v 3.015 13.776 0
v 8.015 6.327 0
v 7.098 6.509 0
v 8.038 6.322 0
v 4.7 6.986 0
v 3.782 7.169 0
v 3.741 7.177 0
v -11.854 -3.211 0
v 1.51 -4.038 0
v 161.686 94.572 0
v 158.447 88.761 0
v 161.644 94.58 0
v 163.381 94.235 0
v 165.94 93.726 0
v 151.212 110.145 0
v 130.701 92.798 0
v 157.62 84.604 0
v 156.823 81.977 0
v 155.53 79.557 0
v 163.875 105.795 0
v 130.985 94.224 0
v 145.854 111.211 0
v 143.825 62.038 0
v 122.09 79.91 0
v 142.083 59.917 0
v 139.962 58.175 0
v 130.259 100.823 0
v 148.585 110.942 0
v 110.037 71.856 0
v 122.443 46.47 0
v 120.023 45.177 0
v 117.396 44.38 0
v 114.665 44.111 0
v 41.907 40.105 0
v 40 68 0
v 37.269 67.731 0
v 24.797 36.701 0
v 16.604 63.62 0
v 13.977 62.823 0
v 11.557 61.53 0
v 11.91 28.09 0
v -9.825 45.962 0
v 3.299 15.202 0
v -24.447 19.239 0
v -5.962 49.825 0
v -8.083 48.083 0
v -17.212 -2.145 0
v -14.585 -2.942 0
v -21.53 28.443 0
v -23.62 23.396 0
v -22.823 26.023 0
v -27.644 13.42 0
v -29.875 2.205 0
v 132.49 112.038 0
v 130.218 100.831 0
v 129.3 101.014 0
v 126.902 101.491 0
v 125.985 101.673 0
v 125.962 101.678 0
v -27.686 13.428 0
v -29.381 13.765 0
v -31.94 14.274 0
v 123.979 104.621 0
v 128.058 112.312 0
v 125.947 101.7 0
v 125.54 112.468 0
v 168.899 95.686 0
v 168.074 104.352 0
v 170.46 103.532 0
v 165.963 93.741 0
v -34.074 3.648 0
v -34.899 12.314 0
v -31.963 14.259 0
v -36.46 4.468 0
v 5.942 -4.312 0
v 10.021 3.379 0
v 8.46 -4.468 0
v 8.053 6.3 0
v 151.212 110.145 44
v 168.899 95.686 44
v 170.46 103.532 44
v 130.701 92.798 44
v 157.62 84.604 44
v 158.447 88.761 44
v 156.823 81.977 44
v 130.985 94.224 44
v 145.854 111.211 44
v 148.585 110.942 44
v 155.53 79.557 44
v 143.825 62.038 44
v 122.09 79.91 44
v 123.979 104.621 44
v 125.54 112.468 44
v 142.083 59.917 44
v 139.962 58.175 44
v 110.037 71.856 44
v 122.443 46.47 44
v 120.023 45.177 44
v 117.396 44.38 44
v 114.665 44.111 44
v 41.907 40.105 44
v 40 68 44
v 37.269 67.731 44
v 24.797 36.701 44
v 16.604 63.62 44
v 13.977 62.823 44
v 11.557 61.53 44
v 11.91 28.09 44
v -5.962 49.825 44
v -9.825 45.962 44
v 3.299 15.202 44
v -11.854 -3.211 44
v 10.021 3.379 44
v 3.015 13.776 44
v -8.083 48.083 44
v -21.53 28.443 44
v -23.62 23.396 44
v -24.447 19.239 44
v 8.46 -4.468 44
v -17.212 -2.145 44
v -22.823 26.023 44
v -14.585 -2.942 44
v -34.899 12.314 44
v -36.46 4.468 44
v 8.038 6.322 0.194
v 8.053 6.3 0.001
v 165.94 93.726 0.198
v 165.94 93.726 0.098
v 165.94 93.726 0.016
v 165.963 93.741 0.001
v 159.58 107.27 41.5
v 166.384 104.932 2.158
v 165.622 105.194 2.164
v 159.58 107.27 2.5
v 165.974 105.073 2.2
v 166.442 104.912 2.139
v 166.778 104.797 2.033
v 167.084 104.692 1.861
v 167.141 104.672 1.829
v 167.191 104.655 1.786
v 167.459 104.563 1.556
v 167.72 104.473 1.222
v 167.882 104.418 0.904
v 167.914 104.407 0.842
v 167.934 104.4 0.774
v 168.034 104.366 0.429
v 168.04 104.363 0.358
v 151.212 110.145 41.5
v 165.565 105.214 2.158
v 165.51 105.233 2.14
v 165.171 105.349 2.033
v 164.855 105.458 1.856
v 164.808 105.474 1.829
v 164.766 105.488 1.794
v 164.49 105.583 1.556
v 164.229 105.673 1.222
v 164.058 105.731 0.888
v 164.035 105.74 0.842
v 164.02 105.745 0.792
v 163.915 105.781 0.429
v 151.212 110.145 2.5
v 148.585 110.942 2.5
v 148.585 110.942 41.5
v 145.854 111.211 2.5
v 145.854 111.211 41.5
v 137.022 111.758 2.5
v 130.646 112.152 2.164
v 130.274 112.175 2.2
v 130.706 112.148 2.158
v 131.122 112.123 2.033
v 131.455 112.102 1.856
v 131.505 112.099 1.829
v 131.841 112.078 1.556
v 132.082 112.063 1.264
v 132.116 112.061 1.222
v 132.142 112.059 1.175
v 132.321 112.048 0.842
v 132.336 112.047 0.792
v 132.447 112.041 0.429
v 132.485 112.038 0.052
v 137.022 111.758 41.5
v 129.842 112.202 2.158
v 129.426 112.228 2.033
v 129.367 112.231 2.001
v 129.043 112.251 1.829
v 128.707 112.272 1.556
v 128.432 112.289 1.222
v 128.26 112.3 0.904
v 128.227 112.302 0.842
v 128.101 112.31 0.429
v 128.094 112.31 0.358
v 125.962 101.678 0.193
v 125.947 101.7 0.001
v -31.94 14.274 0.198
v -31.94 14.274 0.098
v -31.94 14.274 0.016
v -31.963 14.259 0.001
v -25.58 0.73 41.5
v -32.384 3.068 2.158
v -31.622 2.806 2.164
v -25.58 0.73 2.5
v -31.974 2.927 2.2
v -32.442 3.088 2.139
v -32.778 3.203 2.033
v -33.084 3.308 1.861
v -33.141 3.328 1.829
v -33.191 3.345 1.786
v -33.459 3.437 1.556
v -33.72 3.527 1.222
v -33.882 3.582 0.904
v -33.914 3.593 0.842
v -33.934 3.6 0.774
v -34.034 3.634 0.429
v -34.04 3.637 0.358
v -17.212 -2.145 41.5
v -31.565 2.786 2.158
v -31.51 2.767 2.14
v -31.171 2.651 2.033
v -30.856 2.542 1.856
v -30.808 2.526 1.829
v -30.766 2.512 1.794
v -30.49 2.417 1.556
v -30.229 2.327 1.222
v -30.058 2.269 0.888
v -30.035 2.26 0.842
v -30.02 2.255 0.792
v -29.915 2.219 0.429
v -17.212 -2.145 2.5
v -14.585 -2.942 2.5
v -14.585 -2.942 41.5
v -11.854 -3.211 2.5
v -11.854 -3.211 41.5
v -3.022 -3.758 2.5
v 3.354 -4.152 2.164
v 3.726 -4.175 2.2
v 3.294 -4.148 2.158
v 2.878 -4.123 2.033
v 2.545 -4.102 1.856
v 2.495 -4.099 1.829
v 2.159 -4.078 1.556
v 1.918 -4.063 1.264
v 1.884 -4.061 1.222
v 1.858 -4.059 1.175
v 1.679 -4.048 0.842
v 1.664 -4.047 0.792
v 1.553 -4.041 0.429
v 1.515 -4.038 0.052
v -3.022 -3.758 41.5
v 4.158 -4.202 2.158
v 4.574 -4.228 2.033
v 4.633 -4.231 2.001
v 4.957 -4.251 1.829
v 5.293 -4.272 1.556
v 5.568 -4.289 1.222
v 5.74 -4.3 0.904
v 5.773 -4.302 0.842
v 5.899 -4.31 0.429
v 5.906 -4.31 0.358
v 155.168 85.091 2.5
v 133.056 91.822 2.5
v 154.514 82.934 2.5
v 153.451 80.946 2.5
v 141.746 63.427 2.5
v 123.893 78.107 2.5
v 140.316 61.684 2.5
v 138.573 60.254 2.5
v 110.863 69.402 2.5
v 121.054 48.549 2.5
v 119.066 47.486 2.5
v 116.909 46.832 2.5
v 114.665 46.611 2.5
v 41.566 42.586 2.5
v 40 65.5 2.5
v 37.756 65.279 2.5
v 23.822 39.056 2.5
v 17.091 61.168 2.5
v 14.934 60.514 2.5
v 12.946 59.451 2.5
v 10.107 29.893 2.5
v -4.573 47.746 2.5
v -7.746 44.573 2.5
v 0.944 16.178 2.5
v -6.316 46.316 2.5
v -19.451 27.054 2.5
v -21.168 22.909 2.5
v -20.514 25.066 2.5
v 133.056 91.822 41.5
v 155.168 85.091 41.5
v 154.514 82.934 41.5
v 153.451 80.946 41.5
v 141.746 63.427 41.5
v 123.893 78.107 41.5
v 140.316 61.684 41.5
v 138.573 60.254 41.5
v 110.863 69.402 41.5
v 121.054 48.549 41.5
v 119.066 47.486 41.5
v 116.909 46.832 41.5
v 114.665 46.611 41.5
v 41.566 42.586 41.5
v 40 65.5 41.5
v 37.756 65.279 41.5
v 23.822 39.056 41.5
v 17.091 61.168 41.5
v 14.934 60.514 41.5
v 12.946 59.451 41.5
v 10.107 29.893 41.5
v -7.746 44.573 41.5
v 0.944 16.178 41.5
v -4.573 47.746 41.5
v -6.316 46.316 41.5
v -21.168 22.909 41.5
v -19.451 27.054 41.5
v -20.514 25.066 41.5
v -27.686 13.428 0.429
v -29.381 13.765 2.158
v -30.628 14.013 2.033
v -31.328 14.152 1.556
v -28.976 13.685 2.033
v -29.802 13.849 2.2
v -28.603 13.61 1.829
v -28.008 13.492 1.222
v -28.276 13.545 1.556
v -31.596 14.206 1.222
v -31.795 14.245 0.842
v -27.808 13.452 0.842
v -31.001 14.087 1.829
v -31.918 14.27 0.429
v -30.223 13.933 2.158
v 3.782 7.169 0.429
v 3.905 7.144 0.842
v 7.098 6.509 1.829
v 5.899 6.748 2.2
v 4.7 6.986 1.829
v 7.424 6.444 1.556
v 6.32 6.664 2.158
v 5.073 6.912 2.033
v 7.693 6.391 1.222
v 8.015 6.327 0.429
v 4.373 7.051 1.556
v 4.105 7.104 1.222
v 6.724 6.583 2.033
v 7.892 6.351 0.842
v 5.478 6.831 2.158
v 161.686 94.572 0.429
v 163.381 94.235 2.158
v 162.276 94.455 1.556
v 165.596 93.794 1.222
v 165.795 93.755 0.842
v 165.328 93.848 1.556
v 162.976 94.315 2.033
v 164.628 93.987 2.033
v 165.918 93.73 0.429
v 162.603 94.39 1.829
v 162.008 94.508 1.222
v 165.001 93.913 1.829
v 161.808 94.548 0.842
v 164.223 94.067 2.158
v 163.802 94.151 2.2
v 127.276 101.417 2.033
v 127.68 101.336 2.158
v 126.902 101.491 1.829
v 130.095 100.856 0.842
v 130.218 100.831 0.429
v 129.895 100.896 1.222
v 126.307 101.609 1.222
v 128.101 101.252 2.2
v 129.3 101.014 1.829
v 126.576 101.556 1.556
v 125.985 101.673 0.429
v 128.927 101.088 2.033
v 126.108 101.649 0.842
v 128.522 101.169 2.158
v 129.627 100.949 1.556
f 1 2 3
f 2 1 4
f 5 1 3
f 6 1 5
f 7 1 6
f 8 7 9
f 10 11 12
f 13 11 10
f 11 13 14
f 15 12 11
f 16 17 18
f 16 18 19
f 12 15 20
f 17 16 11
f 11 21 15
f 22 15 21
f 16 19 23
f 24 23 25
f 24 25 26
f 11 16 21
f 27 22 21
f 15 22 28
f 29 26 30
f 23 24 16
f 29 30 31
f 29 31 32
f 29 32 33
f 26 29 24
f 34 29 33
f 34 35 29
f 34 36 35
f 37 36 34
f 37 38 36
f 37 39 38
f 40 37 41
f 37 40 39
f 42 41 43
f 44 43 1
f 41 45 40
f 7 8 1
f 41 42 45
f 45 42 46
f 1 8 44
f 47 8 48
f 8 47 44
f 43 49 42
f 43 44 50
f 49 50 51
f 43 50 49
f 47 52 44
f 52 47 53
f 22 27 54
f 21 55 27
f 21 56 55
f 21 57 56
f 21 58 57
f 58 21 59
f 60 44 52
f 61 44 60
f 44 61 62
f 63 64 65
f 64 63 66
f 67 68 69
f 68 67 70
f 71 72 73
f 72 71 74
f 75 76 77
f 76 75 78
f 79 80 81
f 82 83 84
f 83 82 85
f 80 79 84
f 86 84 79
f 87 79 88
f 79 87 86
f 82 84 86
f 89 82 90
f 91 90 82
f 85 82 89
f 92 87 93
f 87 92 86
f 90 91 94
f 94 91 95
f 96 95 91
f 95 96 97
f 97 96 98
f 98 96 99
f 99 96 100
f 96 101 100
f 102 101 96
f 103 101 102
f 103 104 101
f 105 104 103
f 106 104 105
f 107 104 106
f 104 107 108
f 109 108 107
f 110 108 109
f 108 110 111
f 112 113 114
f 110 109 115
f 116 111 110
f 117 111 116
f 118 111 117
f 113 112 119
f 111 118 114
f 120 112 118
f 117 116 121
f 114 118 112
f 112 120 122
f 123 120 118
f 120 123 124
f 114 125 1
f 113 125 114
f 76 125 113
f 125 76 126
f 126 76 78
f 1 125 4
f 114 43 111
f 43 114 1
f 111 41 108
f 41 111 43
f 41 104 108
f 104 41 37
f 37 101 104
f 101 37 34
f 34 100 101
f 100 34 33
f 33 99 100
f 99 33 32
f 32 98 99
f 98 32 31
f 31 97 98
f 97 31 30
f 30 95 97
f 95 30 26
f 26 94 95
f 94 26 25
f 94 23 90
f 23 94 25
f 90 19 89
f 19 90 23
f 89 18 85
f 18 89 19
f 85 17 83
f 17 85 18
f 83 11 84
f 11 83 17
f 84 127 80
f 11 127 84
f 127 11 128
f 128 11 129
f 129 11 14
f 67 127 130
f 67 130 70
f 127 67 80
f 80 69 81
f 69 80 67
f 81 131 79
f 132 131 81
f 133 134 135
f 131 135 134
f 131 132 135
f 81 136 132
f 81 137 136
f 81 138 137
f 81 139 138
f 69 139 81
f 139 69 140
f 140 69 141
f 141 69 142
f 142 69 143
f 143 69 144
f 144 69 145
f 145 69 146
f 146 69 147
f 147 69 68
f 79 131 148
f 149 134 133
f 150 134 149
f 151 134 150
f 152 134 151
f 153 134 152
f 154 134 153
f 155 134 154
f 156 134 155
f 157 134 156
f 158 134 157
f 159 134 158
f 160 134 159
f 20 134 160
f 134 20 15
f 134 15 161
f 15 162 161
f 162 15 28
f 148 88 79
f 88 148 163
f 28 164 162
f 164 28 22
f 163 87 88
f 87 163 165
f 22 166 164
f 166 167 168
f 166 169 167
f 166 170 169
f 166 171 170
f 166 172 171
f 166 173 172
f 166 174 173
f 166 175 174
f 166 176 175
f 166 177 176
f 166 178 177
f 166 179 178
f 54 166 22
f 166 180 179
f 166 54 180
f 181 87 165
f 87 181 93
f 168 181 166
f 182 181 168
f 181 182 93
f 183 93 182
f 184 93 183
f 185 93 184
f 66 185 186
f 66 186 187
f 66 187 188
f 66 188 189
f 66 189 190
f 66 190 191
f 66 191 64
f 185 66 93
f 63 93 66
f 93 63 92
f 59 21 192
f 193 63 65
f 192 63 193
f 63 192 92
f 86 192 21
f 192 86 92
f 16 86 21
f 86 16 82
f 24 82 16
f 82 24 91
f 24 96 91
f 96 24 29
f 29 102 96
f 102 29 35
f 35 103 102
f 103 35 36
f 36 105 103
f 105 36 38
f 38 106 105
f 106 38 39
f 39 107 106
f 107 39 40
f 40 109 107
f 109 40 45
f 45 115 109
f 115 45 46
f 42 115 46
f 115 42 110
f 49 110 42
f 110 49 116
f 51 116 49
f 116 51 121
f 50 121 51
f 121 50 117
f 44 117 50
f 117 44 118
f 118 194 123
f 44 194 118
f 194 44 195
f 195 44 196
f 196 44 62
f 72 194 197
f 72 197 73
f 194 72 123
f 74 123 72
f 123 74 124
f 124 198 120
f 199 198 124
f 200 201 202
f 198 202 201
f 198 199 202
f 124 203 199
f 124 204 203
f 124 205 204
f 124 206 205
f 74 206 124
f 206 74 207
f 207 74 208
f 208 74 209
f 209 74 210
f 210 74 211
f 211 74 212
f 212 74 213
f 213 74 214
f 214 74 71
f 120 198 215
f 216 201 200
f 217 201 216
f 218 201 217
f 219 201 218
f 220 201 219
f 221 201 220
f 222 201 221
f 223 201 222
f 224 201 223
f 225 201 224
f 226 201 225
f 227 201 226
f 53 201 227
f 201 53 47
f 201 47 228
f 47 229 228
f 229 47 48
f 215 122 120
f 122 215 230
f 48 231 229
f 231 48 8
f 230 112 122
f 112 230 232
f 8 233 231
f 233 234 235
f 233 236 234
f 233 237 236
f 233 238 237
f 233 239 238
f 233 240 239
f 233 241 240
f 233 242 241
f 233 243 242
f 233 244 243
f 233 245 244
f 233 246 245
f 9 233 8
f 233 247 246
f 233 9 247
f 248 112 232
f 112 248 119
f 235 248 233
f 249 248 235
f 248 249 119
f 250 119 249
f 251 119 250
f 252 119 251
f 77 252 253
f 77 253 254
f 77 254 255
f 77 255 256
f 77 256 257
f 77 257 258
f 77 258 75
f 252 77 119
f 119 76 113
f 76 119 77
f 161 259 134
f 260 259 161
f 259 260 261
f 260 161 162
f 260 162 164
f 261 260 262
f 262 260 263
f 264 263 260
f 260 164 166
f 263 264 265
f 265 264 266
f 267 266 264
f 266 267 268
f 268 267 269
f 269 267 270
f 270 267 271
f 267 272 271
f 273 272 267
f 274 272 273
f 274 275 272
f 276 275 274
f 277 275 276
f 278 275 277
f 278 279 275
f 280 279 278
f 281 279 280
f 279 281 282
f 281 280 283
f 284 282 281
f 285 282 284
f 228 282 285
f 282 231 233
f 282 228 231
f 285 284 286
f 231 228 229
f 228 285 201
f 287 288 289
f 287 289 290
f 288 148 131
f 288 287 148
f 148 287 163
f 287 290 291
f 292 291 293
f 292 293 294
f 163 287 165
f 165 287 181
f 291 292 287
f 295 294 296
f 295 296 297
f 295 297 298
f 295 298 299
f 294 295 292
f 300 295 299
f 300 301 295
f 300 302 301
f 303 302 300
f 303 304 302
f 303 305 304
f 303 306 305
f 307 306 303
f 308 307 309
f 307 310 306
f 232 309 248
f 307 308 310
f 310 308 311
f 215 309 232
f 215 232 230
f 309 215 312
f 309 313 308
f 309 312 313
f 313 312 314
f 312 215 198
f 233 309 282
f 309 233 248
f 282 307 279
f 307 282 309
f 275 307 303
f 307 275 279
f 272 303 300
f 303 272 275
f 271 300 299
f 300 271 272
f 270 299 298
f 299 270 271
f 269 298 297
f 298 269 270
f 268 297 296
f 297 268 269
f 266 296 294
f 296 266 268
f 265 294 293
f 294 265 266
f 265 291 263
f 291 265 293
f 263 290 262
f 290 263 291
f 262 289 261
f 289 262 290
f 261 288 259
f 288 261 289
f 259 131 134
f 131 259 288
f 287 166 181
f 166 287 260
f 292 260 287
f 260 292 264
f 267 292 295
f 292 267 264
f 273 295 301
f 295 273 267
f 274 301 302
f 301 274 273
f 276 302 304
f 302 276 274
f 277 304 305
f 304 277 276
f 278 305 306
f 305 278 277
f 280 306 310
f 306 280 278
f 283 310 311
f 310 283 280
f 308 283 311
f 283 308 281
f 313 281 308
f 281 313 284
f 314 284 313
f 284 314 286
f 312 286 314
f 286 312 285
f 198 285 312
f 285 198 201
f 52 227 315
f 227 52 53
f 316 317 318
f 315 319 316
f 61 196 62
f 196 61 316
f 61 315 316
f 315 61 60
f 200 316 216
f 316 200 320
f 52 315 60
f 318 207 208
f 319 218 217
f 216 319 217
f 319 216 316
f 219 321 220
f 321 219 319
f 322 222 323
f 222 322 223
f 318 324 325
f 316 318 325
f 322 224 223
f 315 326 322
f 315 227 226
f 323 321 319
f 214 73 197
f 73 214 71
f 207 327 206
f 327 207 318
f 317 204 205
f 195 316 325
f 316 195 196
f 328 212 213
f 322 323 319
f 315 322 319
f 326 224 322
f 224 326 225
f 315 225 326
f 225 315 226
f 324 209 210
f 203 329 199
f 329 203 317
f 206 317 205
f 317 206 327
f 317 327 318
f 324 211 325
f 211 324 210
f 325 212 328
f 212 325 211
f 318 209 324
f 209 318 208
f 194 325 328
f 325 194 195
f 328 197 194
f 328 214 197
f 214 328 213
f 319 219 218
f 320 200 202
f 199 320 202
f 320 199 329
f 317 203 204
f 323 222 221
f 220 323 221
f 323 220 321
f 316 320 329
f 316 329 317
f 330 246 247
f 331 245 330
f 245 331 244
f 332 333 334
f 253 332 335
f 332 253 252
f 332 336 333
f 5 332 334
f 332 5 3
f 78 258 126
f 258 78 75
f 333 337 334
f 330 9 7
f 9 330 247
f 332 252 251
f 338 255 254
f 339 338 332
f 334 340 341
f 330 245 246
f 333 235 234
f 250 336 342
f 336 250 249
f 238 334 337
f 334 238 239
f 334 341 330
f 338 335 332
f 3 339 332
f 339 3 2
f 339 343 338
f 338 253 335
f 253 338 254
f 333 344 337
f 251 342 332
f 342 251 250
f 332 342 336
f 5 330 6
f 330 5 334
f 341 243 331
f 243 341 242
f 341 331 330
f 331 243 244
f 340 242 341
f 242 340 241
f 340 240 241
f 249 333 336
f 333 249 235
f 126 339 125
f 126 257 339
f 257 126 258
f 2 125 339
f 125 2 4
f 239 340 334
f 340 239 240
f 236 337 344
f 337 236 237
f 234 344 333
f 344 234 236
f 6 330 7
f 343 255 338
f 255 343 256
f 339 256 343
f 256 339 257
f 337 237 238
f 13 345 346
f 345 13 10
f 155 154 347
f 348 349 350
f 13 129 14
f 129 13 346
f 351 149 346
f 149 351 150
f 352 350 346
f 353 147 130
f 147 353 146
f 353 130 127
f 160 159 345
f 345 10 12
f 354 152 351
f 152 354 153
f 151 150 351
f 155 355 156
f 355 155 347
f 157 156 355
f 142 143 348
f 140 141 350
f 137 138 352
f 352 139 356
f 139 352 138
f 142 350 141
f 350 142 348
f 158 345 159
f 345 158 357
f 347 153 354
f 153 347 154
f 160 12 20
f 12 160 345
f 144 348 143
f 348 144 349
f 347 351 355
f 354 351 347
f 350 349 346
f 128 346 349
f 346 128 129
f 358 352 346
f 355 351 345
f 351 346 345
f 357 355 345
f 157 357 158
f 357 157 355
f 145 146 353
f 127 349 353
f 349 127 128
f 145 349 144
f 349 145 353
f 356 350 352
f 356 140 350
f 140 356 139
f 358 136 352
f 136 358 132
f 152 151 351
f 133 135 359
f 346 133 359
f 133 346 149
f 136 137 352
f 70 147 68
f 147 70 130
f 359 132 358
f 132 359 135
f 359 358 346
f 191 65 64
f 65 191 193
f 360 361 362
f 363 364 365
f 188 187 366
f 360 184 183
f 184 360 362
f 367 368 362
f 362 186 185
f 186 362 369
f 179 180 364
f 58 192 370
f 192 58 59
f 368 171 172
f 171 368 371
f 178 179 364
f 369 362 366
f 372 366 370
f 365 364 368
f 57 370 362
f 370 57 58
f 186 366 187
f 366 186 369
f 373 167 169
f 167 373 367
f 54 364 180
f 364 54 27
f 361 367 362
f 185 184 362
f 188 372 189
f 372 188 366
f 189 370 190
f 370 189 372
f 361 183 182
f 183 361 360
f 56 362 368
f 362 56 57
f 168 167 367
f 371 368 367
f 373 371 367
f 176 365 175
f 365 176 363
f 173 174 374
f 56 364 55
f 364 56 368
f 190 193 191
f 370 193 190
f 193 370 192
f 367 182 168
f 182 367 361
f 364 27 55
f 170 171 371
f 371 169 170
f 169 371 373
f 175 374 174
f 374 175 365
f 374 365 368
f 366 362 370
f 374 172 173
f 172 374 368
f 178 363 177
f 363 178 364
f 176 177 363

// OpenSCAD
$fn = 32;

// ----------------------------------------------------------------------
// Air duct: 28 mm duct, 2.5 mm wall, 44 mm across
// ----------------------------------------------------------------------

// --- parameters (mm) ---
duct_r = 14;              // duct core radius
duct_d = 28;              // duct core diameter
wall = 2.5;               // duct wall thickness
height = 44;              // duct width (extrusion height)
port_r = 22.9;            // port flange half width
port_d = 45.8;            // port flange width
port_t = 8;               // port flange thickness
bolt_d = 4.4;             // port bolt holes
bolt_offset = 18.2;       // bolt hole offset from the port axis

difference() {
  /* outer hull chain: tube with a flat flange plate at every port */
  linear_extrude(height = 44) {
    hull() {
      polygon([[8.46, -4.468], [-36.46, 4.468], [-34.899, 12.314], [10.021, 3.379]]);
      translate([-11.854, 10.789]) circle(r = 14);
    }
    hull() {
      translate([-11.854, 10.789]) circle(r = 14);
      translate([-9.889, 20.665]) circle(r = 14);
    }
    hull() {
      translate([-9.889, 20.665]) circle(r = 14);
      translate([1.816, 38.184]) circle(r = 14);
    }
    hull() {
      translate([1.816, 38.184]) circle(r = 14);
      translate([19.335, 49.889]) circle(r = 14);
    }
    hull() {
      translate([19.335, 49.889]) circle(r = 14);
      translate([40, 54]) circle(r = 14);
    }
    hull() {
      translate([40, 54]) circle(r = 14);
      translate([114.665, 58.111]) circle(r = 14);
    }
    hull() {
      translate([114.665, 58.111]) circle(r = 14);
      translate([132.184, 69.816]) circle(r = 14);
    }
    hull() {
      translate([132.184, 69.816]) circle(r = 14);
      translate([143.889, 87.335]) circle(r = 14);
    }
    hull() {
      translate([143.889, 87.335]) circle(r = 14);
      translate([145.854, 97.211]) circle(r = 14);
    }
    hull() {
      translate([145.854, 97.211]) circle(r = 14);
      polygon([[125.54, 112.468], [170.46, 103.532], [168.899, 95.686], [123.979, 104.621]]);
    }
  }
  /* air passage: the same chain inset by the wall, 5 mm proud of the ports */
  translate([0, 0, 2.5]) linear_extrude(height = 39) {
    hull() {
      translate([-14.975, -4.904]) circle(r = 11.5);
      translate([-9.889, 20.665]) circle(r = 11.5);
    }
    hull() {
      translate([-9.889, 20.665]) circle(r = 11.5);
      translate([1.816, 38.184]) circle(r = 11.5);
    }
    hull() {
      translate([1.816, 38.184]) circle(r = 11.5);
      translate([19.335, 49.889]) circle(r = 11.5);
    }
    hull() {
      translate([19.335, 49.889]) circle(r = 11.5);
      translate([40, 54]) circle(r = 11.5);
    }
    hull() {
      translate([40, 54]) circle(r = 11.5);
      translate([114.665, 58.111]) circle(r = 11.5);
    }
    hull() {
      translate([114.665, 58.111]) circle(r = 11.5);
      translate([132.184, 69.816]) circle(r = 11.5);
    }
    hull() {
      translate([132.184, 69.816]) circle(r = 11.5);
      translate([143.889, 87.335]) circle(r = 11.5);
    }
    hull() {
      translate([143.889, 87.335]) circle(r = 11.5);
      translate([148.975, 112.904]) circle(r = 11.5);
    }
  }
  translate([-14, 0]) rotate([0, 0, -11.25]) translate([-18.2, -2.5]) rotate([-90, 0, 0]) cylinder(h = 13, d = 4.4);
  translate([-14, 0]) rotate([0, 0, -11.25]) translate([18.2, -2.5]) rotate([-90, 0, 0]) cylinder(h = 13, d = 4.4);
  translate([148, 108]) rotate([0, 0, 168.75]) translate([-18.2, -2.5]) rotate([-90, 0, 0]) cylinder(h = 13, d = 4.4);
  translate([148, 108]) rotate([0, 0, 168.75]) translate([18.2, -2.5]) rotate([-90, 0, 0]) cylinder(h = 13, d = 4.4);
}
